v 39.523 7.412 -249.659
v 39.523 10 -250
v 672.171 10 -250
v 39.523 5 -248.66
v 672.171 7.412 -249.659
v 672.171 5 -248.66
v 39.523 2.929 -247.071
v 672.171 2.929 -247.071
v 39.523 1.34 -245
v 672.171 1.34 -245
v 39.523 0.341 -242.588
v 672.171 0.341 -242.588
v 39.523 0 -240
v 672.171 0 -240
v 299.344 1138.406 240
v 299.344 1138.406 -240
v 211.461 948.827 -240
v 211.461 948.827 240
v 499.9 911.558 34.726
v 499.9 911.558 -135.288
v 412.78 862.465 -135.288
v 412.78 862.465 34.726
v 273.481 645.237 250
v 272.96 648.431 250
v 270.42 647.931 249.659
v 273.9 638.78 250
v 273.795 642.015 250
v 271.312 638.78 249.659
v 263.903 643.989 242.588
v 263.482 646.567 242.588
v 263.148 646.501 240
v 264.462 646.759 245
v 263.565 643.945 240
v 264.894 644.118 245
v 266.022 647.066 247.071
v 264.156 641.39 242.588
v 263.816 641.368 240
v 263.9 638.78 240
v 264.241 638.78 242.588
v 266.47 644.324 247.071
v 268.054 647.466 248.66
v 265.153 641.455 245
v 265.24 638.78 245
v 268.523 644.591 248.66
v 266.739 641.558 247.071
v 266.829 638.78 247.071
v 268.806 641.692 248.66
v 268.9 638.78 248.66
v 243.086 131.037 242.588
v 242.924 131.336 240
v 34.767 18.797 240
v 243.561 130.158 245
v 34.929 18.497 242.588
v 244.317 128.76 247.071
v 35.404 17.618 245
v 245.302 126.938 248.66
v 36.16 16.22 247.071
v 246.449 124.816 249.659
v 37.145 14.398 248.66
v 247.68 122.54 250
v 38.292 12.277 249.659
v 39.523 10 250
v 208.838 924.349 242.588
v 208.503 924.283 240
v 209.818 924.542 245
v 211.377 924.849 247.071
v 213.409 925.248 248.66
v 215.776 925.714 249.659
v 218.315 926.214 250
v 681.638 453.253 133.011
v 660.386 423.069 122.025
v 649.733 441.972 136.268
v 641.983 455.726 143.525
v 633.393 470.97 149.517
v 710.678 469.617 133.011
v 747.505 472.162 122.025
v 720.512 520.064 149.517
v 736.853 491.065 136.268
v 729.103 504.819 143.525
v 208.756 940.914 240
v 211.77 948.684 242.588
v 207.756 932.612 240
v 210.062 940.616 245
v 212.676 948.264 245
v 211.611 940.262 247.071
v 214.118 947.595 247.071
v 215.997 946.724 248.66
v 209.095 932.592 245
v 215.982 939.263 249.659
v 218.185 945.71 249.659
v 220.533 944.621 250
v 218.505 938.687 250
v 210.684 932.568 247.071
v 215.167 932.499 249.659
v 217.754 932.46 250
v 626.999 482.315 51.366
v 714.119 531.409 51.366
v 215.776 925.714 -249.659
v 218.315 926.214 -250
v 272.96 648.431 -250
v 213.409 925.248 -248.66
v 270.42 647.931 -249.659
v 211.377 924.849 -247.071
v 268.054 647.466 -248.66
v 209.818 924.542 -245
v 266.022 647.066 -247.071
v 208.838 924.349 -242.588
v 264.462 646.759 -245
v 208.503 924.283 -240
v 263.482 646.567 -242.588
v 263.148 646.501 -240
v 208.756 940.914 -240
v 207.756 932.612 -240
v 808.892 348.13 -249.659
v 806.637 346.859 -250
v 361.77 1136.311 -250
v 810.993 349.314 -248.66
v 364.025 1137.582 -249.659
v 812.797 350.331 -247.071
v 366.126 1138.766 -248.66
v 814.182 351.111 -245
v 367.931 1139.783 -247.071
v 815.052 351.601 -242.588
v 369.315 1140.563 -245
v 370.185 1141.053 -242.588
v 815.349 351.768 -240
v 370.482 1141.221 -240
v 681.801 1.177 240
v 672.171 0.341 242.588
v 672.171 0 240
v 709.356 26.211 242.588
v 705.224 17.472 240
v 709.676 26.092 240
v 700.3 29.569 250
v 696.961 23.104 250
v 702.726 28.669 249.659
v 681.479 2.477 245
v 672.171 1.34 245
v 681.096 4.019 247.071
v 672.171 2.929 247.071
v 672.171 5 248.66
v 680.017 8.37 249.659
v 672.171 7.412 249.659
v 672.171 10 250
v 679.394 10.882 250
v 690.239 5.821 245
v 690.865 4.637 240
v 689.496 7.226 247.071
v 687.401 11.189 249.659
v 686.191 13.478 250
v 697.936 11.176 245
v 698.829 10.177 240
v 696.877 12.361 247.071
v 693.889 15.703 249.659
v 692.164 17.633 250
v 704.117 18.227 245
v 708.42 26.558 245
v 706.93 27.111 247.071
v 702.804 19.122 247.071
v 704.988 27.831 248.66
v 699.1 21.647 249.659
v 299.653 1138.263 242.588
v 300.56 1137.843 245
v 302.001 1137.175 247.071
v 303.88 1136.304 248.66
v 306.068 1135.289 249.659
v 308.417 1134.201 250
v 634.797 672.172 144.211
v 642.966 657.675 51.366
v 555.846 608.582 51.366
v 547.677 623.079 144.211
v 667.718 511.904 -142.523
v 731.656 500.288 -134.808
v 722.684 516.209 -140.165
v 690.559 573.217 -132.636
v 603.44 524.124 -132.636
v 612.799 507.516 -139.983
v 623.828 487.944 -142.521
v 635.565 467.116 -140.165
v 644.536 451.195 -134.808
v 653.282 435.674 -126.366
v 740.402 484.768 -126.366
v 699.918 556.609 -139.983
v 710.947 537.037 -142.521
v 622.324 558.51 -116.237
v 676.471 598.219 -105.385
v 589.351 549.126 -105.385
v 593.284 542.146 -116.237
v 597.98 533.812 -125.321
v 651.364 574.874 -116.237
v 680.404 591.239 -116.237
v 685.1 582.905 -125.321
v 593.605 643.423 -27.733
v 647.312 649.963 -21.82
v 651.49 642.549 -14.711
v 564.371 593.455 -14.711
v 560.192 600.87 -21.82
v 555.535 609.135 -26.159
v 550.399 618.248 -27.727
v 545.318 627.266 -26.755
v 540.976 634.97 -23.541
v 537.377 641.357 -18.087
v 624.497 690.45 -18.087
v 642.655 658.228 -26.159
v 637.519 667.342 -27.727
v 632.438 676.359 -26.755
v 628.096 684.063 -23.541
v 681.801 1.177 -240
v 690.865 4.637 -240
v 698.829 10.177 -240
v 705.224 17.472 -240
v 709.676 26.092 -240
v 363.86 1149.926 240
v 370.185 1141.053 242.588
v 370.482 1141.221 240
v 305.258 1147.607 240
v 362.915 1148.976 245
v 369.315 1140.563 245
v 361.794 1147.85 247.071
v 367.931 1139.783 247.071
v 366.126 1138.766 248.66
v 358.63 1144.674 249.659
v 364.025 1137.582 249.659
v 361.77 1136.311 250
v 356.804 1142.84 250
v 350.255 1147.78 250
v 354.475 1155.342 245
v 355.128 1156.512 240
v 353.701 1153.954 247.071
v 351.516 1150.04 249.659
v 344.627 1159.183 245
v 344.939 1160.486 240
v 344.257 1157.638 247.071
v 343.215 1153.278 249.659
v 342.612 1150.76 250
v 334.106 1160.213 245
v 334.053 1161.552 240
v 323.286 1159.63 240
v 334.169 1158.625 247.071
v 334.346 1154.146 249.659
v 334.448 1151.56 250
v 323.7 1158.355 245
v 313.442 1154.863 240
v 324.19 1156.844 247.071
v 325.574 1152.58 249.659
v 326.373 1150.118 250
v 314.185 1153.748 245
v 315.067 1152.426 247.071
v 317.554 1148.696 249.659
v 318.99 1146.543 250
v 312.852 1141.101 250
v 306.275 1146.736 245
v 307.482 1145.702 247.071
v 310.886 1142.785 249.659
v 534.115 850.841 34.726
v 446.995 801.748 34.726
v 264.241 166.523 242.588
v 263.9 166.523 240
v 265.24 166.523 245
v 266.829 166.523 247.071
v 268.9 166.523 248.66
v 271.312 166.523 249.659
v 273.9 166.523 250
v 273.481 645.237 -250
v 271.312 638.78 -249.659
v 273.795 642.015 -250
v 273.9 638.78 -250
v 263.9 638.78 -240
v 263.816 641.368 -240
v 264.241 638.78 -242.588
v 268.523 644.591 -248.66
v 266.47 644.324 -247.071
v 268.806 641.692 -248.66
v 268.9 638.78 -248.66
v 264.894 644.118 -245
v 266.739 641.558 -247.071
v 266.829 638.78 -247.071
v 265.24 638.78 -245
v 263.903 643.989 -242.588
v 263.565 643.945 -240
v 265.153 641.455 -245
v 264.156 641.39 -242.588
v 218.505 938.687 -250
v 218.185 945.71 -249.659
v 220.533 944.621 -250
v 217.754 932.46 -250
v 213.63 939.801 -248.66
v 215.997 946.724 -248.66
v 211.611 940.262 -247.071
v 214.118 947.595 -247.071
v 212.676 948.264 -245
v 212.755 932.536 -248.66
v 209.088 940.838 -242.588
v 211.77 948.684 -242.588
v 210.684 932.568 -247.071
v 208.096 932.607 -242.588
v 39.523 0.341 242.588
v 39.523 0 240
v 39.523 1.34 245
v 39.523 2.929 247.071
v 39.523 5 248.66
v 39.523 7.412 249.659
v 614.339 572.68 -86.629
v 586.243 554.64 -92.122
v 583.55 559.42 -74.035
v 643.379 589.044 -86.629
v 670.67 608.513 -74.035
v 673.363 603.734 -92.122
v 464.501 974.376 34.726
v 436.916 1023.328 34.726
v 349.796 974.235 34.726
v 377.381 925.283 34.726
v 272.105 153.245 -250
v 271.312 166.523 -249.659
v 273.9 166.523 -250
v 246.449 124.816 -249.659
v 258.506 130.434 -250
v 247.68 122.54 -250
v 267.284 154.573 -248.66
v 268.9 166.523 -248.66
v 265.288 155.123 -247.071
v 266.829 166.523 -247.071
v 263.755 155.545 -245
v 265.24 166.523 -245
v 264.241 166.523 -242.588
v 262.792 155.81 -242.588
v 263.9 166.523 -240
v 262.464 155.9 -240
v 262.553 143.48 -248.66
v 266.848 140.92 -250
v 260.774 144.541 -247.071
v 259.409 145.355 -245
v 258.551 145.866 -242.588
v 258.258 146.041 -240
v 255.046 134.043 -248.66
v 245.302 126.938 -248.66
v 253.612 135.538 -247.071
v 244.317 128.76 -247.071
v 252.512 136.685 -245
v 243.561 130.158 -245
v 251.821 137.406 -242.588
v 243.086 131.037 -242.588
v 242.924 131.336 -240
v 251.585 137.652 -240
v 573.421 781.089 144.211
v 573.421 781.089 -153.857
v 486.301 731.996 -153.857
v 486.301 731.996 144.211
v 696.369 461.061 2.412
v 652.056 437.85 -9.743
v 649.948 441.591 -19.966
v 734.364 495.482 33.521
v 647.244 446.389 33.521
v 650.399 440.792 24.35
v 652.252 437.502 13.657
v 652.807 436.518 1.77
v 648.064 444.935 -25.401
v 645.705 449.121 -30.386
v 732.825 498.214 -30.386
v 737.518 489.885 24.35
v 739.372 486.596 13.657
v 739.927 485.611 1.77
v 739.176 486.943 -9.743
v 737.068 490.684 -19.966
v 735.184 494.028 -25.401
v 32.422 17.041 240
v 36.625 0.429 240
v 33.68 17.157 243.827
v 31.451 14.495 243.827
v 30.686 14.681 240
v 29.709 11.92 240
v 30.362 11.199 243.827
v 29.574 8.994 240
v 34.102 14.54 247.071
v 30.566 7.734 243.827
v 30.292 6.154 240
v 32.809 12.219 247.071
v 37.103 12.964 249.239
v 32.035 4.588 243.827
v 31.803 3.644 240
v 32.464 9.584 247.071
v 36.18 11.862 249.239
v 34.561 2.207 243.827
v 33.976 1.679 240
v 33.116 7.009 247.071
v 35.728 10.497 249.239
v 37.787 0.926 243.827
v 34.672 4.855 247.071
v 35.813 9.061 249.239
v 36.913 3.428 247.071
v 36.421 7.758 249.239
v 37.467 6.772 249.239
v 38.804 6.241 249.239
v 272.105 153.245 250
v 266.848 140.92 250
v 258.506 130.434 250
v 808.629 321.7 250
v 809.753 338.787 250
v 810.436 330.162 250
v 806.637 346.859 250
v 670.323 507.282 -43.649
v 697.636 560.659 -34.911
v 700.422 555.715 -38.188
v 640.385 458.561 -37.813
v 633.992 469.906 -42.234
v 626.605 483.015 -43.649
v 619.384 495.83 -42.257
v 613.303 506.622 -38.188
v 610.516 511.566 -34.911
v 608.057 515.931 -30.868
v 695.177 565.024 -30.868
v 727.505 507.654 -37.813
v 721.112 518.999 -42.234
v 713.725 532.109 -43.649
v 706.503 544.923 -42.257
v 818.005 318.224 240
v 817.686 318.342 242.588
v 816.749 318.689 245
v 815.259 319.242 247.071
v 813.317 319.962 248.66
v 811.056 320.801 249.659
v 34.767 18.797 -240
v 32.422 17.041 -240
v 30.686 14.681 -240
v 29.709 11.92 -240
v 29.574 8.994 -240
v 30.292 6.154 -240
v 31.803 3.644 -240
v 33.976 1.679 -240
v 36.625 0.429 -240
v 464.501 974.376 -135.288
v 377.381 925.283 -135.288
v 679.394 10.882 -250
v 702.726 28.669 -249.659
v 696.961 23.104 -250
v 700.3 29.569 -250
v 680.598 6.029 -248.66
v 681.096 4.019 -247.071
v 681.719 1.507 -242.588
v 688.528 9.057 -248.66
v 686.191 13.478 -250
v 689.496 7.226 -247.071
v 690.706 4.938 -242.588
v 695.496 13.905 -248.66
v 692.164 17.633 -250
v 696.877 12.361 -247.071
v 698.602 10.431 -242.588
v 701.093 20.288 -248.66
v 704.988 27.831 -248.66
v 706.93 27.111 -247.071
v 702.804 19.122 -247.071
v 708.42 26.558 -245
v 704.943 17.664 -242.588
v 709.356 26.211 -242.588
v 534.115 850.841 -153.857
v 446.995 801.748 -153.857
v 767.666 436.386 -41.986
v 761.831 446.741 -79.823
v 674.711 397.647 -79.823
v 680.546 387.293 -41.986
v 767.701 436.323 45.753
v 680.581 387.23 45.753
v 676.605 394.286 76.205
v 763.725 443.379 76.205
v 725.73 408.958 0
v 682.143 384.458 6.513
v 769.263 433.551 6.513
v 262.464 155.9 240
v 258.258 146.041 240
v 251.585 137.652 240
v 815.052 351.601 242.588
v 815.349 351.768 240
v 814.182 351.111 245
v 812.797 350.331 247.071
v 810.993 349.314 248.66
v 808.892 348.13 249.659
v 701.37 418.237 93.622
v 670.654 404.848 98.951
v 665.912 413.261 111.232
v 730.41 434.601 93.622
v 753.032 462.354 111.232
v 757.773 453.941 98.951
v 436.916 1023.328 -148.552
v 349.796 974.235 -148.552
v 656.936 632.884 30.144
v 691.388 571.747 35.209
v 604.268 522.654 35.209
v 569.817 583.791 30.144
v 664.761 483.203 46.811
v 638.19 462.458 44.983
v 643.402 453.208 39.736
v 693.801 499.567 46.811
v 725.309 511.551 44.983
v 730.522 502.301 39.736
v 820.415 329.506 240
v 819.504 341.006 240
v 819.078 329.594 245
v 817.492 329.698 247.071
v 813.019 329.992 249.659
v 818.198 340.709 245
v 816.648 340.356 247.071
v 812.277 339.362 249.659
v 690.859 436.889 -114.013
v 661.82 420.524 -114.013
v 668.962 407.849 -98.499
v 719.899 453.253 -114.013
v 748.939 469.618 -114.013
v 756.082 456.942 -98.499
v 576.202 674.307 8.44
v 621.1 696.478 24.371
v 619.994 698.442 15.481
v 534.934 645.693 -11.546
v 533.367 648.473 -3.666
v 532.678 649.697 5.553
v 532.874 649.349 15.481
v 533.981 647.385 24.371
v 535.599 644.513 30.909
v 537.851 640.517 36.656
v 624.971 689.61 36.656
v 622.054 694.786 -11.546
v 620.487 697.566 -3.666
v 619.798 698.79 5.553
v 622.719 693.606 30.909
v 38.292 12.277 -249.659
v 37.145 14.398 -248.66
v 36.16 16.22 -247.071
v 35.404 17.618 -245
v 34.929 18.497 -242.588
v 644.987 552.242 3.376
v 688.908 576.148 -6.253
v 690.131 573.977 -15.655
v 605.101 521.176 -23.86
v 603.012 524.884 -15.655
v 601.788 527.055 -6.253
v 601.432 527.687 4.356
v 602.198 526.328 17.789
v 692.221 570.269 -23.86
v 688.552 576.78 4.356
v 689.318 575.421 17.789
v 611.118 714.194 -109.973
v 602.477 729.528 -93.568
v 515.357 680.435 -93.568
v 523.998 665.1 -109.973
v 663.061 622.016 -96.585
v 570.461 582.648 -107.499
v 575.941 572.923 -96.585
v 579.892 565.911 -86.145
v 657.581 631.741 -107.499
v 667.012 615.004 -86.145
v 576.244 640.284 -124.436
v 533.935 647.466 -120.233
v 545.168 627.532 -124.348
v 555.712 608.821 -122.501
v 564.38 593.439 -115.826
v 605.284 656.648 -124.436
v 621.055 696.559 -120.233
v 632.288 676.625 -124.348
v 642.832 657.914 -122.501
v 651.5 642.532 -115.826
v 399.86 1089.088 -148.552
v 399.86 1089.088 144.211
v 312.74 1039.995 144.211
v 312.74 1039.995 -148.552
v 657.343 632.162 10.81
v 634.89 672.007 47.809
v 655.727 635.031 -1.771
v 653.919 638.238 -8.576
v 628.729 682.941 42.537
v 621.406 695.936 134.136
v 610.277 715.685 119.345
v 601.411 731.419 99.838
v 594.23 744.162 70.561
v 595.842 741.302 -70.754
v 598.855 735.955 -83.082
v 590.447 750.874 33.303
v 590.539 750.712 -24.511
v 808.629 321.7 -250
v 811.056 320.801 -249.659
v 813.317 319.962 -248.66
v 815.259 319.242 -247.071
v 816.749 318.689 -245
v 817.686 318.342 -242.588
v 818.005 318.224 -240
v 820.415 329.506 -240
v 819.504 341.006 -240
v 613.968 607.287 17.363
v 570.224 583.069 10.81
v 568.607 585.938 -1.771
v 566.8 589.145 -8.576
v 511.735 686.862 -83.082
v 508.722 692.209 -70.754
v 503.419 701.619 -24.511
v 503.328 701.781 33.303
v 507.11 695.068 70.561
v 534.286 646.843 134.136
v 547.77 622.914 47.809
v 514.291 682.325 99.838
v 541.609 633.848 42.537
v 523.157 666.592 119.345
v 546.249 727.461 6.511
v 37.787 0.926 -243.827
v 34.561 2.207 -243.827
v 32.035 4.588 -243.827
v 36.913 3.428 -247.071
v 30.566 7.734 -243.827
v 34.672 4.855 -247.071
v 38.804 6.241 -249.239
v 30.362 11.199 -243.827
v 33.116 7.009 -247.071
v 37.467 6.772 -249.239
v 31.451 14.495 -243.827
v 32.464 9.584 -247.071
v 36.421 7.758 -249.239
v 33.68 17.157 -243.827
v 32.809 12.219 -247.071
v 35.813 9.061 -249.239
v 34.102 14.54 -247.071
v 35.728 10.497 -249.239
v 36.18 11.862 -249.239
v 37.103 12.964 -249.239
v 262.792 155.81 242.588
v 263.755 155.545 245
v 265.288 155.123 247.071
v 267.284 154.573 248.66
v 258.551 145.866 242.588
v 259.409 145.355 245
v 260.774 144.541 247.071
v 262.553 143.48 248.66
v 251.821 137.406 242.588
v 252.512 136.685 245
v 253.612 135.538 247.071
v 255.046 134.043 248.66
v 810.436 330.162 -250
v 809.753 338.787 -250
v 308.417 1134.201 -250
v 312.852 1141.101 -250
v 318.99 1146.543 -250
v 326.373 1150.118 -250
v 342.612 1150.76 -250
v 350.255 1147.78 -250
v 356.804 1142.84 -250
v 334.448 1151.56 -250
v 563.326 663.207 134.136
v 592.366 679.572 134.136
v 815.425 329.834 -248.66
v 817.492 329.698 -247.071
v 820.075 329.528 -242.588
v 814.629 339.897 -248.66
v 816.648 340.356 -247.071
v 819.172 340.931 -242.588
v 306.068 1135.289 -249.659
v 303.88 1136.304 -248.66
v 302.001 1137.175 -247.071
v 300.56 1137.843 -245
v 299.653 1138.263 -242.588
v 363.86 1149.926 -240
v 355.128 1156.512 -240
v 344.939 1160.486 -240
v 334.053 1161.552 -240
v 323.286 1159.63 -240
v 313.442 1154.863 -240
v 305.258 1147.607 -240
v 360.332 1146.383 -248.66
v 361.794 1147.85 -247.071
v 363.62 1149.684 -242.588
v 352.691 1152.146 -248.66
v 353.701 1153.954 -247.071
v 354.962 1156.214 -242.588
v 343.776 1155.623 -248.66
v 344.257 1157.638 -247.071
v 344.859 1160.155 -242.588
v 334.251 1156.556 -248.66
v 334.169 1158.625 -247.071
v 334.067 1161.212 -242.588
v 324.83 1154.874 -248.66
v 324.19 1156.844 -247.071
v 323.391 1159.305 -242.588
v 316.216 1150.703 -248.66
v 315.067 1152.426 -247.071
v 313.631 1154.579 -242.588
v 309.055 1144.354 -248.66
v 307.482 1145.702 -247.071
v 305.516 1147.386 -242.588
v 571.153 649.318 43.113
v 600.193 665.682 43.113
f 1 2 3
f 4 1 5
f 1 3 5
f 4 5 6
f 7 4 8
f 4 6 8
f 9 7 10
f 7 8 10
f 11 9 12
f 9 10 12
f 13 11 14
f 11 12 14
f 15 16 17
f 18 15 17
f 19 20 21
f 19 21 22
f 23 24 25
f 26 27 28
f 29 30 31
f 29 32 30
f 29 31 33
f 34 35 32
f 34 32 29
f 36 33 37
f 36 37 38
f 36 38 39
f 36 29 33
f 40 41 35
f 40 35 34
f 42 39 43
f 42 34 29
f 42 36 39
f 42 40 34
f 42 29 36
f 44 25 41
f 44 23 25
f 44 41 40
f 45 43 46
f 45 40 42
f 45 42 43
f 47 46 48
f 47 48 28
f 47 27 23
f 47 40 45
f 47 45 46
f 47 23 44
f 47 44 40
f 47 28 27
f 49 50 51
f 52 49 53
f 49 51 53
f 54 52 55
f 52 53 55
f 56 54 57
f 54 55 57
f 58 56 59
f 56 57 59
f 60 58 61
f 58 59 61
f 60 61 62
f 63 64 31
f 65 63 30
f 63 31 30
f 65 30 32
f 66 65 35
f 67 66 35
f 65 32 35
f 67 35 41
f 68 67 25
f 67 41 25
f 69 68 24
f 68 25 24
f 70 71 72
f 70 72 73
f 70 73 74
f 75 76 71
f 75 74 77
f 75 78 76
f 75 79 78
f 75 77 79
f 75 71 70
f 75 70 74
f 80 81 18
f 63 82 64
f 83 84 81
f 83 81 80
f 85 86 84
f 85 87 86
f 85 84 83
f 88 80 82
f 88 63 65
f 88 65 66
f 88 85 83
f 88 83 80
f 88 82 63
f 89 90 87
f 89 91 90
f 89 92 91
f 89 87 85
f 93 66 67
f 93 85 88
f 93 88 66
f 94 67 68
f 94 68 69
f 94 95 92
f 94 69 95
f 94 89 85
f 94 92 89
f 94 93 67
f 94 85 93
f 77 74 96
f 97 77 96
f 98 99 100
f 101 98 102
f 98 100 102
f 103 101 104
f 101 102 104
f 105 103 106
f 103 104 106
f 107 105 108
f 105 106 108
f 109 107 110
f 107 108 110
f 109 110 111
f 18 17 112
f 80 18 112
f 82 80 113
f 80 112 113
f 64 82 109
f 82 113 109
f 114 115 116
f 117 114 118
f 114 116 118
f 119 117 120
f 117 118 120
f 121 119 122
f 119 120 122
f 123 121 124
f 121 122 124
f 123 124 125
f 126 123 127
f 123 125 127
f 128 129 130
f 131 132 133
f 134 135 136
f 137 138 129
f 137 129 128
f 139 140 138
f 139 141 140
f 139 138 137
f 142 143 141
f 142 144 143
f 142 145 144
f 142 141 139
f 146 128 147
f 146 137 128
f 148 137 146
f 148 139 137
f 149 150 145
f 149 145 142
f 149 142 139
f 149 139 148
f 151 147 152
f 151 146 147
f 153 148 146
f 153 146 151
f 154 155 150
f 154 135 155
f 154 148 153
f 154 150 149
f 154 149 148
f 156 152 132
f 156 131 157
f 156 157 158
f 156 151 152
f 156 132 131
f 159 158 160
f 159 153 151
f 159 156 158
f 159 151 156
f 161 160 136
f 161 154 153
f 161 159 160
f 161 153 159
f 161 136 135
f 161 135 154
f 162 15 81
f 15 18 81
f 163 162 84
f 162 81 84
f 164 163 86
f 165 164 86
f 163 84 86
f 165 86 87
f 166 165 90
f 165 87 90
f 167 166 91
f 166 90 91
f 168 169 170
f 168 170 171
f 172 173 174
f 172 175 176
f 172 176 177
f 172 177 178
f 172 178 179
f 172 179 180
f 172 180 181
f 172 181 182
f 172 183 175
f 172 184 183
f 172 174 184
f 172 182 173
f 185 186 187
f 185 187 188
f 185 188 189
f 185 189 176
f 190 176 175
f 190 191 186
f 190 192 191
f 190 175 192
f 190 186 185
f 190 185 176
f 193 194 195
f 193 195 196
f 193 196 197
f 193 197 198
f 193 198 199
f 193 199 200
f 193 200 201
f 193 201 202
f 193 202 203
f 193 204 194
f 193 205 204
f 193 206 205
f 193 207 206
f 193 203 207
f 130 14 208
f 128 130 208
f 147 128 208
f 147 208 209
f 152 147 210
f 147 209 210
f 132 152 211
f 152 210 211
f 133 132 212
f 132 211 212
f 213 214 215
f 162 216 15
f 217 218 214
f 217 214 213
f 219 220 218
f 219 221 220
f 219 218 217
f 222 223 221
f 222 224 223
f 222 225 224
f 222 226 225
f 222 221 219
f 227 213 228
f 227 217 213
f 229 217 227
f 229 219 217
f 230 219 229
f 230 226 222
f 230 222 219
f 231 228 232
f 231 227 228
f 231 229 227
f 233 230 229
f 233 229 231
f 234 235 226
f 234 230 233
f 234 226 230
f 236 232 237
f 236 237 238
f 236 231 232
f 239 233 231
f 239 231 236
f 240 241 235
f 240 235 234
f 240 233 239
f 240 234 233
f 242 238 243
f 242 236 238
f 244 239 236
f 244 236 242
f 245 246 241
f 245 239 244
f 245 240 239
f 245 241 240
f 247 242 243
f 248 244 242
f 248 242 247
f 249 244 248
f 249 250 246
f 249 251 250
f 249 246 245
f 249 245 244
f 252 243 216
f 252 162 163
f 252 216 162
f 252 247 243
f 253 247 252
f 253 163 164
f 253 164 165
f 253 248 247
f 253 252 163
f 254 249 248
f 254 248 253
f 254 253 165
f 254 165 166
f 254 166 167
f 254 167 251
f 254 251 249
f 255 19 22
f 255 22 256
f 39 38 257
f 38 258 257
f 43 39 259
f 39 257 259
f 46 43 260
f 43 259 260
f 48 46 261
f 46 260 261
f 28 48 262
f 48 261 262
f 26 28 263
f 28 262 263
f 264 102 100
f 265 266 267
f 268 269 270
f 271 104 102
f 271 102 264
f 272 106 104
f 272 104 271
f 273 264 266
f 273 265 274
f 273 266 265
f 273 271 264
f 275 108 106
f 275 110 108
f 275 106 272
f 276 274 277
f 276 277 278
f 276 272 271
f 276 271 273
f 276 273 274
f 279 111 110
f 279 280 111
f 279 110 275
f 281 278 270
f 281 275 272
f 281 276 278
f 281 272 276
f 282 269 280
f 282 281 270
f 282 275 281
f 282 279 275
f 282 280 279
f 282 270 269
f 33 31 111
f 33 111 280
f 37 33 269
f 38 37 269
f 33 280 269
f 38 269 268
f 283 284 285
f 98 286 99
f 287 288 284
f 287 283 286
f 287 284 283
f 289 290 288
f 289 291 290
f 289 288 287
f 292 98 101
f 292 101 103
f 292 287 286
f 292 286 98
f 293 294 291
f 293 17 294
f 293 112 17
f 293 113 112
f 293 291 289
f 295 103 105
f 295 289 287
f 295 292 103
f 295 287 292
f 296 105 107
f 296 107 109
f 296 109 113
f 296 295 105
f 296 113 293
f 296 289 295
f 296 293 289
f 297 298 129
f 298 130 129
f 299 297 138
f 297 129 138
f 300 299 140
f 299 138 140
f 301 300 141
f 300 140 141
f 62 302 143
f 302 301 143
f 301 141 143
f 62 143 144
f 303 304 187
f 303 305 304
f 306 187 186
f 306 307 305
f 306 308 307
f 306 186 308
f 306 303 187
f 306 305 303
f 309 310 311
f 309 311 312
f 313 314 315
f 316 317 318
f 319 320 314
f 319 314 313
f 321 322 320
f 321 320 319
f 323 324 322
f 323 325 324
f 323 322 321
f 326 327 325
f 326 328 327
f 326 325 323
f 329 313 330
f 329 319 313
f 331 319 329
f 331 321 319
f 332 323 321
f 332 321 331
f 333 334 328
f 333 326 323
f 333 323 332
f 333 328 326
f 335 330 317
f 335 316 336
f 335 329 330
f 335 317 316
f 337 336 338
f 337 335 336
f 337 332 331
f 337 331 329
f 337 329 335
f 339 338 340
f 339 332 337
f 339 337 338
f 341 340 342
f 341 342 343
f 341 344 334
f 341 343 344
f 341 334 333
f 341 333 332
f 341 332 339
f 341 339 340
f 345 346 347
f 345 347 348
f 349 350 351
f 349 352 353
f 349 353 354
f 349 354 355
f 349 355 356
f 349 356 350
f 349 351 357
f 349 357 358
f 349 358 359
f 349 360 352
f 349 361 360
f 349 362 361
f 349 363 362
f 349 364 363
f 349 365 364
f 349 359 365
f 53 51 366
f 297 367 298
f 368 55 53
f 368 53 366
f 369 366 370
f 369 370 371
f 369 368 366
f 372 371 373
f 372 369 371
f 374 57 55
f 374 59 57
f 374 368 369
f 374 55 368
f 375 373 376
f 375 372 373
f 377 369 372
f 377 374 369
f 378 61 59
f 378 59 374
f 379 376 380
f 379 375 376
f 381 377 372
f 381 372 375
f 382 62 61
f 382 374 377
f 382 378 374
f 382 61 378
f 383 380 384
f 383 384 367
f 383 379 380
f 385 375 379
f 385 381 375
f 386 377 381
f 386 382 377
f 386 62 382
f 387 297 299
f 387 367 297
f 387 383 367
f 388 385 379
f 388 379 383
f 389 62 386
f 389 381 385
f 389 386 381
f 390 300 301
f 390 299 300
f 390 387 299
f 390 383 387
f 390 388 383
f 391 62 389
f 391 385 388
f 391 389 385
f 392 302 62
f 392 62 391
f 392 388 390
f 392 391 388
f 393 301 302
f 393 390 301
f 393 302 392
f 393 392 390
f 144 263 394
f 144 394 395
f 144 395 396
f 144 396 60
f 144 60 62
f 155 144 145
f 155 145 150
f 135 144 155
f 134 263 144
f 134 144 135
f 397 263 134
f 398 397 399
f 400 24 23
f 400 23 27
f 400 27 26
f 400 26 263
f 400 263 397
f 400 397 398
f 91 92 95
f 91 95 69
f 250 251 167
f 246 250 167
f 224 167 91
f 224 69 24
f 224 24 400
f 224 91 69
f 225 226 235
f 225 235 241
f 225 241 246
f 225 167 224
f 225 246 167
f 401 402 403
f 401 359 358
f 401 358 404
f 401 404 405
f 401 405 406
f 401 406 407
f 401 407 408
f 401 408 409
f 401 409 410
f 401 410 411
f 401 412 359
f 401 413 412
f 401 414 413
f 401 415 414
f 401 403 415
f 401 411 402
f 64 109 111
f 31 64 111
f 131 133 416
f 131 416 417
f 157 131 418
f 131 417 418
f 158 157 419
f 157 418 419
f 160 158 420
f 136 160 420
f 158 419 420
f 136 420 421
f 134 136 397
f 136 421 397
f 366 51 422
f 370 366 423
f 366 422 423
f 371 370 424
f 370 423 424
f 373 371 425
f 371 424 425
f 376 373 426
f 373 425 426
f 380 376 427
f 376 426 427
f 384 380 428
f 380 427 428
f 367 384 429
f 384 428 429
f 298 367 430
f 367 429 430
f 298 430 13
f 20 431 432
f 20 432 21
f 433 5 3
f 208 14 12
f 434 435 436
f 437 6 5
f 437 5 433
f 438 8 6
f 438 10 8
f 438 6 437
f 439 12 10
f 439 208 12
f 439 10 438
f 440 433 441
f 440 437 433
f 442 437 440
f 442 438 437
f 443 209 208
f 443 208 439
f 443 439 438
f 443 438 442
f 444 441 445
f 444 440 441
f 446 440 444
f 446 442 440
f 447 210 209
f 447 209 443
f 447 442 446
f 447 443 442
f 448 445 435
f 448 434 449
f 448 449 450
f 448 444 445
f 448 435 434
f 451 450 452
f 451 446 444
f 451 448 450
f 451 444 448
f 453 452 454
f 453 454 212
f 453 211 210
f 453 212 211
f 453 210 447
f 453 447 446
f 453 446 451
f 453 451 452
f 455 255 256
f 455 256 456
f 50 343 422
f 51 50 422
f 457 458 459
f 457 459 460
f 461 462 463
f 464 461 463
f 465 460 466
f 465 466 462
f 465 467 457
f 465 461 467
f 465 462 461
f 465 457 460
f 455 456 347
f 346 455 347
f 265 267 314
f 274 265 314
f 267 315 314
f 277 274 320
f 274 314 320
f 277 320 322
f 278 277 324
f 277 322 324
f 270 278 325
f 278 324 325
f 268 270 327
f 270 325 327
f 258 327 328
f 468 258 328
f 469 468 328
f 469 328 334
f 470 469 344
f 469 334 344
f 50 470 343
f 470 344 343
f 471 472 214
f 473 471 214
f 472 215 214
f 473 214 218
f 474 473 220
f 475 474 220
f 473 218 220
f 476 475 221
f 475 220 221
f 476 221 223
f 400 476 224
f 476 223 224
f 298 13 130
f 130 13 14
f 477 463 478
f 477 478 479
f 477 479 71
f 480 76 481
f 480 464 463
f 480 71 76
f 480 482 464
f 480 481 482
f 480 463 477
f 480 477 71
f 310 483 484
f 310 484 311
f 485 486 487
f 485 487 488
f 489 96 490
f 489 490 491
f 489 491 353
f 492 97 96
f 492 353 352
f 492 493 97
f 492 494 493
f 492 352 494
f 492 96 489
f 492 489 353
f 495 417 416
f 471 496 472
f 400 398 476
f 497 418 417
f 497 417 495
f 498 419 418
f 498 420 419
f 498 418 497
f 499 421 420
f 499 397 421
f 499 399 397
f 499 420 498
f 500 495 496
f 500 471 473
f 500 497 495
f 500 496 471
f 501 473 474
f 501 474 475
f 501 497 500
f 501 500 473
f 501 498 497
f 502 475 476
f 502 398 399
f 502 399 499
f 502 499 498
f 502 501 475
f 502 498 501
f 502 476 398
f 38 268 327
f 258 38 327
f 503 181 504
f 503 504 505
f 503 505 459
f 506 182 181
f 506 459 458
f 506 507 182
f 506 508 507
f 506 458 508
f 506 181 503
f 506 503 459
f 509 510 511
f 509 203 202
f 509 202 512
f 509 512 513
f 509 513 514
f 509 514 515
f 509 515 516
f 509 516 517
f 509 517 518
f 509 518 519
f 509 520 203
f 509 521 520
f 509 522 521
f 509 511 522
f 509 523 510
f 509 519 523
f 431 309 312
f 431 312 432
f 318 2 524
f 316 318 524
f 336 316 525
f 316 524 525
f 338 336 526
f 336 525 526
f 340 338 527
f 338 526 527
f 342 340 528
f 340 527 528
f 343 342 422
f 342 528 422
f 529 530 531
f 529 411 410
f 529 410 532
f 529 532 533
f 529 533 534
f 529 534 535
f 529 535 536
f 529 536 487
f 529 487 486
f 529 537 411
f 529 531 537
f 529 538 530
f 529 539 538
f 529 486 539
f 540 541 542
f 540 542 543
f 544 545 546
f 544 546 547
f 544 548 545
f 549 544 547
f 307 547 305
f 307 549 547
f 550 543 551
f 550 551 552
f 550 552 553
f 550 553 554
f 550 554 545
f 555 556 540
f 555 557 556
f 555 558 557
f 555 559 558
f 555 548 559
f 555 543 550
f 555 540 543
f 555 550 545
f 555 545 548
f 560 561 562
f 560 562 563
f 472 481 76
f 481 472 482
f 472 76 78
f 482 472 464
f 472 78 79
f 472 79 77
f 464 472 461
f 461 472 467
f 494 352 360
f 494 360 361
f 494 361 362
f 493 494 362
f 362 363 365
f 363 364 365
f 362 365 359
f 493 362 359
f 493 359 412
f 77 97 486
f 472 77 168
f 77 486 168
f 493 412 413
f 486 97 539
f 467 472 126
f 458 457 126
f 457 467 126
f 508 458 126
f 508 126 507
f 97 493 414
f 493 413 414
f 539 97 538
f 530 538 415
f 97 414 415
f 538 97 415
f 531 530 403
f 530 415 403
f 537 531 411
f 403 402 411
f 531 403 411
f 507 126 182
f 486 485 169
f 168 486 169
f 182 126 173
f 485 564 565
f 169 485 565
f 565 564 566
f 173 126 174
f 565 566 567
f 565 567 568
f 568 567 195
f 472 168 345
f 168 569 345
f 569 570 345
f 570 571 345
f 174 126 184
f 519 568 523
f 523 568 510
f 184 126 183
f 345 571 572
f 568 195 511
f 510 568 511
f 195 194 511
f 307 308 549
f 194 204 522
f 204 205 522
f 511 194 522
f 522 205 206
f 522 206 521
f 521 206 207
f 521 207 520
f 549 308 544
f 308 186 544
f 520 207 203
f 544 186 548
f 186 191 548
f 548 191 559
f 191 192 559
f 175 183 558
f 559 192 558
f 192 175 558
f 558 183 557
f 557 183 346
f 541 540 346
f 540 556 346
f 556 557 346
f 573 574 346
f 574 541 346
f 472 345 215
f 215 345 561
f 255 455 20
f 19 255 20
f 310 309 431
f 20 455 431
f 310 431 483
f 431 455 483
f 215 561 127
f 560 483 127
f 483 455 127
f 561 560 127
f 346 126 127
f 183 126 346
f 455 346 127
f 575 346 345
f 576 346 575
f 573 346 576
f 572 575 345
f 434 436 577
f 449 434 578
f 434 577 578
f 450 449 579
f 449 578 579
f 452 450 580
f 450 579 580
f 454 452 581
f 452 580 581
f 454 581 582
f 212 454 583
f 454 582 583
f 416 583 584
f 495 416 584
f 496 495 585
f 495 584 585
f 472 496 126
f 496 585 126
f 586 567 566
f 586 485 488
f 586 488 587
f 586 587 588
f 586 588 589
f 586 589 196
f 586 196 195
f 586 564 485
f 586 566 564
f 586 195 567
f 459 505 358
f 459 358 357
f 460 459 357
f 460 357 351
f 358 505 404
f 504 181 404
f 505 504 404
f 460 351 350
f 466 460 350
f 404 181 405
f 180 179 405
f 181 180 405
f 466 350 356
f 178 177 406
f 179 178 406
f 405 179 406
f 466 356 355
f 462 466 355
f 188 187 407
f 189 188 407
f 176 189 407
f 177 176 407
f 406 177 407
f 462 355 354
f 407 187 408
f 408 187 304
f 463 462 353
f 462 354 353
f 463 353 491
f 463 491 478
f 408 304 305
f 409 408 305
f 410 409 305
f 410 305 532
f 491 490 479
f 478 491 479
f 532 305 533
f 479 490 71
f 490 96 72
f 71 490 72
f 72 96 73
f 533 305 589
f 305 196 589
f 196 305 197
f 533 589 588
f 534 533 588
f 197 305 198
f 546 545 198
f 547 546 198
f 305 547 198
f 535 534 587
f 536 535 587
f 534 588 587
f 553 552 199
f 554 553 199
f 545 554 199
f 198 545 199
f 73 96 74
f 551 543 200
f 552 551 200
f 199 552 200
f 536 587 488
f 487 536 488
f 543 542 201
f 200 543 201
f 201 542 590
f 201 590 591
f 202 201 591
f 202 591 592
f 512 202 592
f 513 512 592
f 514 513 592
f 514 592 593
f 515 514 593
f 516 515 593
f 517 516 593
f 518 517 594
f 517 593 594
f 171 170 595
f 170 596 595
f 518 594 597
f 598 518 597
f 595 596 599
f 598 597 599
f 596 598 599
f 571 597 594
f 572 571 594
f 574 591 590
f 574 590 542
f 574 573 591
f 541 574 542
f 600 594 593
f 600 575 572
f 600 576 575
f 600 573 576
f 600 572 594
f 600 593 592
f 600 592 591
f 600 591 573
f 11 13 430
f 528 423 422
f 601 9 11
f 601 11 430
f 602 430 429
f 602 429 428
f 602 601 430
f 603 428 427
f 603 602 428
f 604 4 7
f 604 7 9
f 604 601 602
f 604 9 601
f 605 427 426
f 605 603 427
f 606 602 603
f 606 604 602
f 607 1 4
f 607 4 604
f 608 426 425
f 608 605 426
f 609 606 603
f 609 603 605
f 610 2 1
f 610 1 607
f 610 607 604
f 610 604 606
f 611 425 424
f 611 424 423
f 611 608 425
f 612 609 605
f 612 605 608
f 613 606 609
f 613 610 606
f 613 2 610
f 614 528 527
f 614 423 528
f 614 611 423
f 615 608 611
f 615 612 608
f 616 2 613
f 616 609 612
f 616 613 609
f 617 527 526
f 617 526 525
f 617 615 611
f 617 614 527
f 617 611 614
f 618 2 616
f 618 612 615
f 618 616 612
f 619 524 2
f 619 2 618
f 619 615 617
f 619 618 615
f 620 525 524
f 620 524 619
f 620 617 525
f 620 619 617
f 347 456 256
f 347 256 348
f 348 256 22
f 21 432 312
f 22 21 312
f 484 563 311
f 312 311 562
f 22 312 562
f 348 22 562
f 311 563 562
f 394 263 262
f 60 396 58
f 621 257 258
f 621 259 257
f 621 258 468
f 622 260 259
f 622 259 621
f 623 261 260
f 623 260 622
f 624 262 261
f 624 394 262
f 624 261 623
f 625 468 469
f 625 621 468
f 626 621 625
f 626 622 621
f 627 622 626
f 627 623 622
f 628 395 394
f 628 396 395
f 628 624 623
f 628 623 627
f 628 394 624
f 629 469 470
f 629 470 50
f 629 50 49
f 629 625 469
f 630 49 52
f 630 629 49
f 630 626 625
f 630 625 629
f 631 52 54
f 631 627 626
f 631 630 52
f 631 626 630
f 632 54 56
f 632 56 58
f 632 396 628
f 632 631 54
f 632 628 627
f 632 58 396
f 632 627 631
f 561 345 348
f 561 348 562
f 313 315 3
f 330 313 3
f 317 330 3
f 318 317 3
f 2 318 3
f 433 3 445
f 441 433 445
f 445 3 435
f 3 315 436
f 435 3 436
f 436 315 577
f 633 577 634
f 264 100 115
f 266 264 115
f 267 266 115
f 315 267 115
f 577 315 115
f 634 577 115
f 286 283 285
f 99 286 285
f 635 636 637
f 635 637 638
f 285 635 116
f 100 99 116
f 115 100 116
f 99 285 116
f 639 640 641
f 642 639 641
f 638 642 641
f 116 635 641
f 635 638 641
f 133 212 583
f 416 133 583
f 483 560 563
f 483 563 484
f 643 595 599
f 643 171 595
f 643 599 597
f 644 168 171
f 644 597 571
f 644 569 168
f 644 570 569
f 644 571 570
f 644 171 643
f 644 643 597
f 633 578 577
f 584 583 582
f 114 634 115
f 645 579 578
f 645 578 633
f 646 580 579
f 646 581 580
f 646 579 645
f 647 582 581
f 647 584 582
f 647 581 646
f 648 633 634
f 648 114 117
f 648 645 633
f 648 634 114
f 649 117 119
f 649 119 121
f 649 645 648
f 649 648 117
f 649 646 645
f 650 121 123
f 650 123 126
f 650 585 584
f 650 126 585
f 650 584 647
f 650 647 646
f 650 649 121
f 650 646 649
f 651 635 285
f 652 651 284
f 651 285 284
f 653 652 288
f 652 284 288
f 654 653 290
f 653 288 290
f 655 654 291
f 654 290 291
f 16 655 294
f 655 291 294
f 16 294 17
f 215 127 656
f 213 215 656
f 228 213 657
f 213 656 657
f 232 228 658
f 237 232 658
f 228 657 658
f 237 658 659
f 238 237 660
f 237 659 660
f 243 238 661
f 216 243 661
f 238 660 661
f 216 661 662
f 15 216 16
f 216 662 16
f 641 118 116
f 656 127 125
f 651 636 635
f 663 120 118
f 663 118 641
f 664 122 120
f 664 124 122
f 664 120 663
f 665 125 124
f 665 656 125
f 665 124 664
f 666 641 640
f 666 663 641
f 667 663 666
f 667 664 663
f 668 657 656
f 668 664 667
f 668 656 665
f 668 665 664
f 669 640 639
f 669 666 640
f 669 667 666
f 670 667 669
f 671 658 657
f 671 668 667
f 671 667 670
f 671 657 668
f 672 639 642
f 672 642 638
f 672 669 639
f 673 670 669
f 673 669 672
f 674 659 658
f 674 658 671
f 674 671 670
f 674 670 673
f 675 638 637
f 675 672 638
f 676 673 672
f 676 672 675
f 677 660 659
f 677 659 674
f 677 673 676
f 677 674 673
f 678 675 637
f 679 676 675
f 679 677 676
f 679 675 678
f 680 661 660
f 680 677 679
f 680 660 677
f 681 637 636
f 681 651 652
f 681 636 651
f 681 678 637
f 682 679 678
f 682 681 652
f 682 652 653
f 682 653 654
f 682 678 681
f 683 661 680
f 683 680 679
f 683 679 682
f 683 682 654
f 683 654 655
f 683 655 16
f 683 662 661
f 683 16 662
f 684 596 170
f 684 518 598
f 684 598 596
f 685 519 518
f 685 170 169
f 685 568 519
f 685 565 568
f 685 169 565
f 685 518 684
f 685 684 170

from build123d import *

# Parameters (mm, degrees)
BOSS_EXTRUDE4_DEPTH      = 250
BOSS_EXTRUDE4_DEPTH_BACK = 250
FILLET1_R                = 10
FILLET2_R                = 10
FILLET3_R                = 10
CUT_EXTRUDE1_DEPTH       = 100


with BuildPart() as part:
    # Sketch5 → Boss-Extrude4 (new, two sides: drawn at the far end of the back side and taken through both)
    with BuildSketch(Plane.XY.offset(-BOSS_EXTRUDE4_DEPTH_BACK)):
        with BuildLine():
            Line((0, 0), (672.171335821, 0))
            ThreePointArc((672.171335821, 0), (695.015340994, 7.164783727), (709.67572834, 26.092428616))
            Line((709.67572834, 26.092428616), (818.005303321, 318.223584322))
            ThreePointArc((818.005303321, 318.223584322), (820.376071762, 335.288930001), (815.348837324, 351.768416645))
            Line((815.348837324, 351.768416645), (740.331547095, 484.892737084))
            Line((740.331547095, 484.892737084), (370.482259657, 1141.220563707))
            ThreePointArc((370.482259657, 1141.220563707), (334.053202103, 1161.55204086), (299.344064495, 1138.4063941))
            Line((299.344064495, 1138.4063941), (211.46075369, 948.827148814))
            ThreePointArc((211.46075369, 948.827148814), (208.038304344, 936.789455071), (208.503214572, 924.283333024))
            Line((208.503214572, 924.283333024), (263.147839607, 646.500885254))
            ThreePointArc((263.147839607, 646.500885254), (263.711539672, 642.658800356), (263.900031848, 638.780160797))
            Line((263.900031848, 638.780160797), (263.900031848, 166.522987154))
            ThreePointArc((263.900031848, 166.522987154), (258.258035835, 146.04061517), (242.923653745, 131.336316241))
            Line((242.923653745, 131.336316241), (0, 0))
        make_face()
    extrude(amount=BOSS_EXTRUDE4_DEPTH + BOSS_EXTRUDE4_DEPTH_BACK)

    # Fillet1
    fillet1_edges = [part.edges().sort_by_distance(p)[0] for p in [
        (121.461826872, 65.66815812, 250),
        (336.085667911, 0, 250),
        (695.015340994, 7.164783727, 250),
        (763.840515831, 172.158006469, 250),
        (820.376071762, 335.288930001, 250),
        (592.91554849, 746.494490176, 250),
        (334.053202103, 1161.55204086, 250),
        (255.402409092, 1043.616771457, 250),
        (208.038304344, 936.789455071, 250),
        (235.825527089, 785.392109139, 250),
        (263.711539672, 642.658800356, 250),
        (263.900031848, 402.651573975, 250),
        (258.258035835, 146.04061517, 250),
    ]]
    fillet(fillet1_edges, radius=FILLET1_R)

    # Fillet2
    fillet2_edges = [part.edges().sort_by_distance(p)[0] for p in [
        (695.015340994, 7.164783727, -250),
        (763.840515831, 172.158006469, -250),
        (820.376071762, 335.288930001, -250),
        (592.91554849, 746.494490176, -250),
        (334.053202103, 1161.55204086, -250),
        (255.402409092, 1043.616771457, -250),
        (208.038304344, 936.789455071, -250),
        (235.825527089, 785.392109139, -250),
        (263.711539672, 642.658800356, -250),
        (121.461826872, 65.66815812, -250),
        (263.900031848, 402.651573975, -250),
        (258.258035835, 146.04061517, -250),
        (336.085667911, 0, -250),
    ]]
    fillet(fillet2_edges, radius=FILLET2_R)

    # Fillet3
    # the kernel refuses this fillet: 10 mm, written as the material it takes off along each edge
    with BuildSketch(Plane(origin=(39.52279504, 10, 240), x_dir=(0, -1, 0), z_dir=(0, 0, 1))) as fillet3_piece_1_section:
        Polygon((0, 0), (FILLET3_R, 0), (FILLET3_R, -FILLET3_R * 3.95227950403), (-FILLET3_R * 0.879666772827, -FILLET3_R * 0.475590547408), align=None)
    fillet3_piece_1 = extrude(amount=FILLET3_R, mode=Mode.PRIVATE)
    fillet3_piece_1 = fillet3_piece_1 - Plane(origin=(39.52279504, 10, 240), x_dir=(0.9694500432790283, 0.24528883706008733, 0), z_dir=(0, 0, 1)) * Sphere(FILLET3_R, mode=Mode.PRIVATE)
    add(fillet3_piece_1, mode=Mode.SUBTRACT)
    with BuildSketch(Plane(origin=(39.52279504, 10, -240), x_dir=(0, -1, 0), z_dir=(0, 0, -1))) as fillet3_piece_2_section:
        Polygon((0, 0), (FILLET3_R, 0), (FILLET3_R, FILLET3_R * 3.95227950403), (-FILLET3_R * 0.879666772827, FILLET3_R * 0.475590547408), align=None)
    fillet3_piece_2 = extrude(amount=FILLET3_R, mode=Mode.PRIVATE)
    fillet3_piece_2 = fillet3_piece_2 - Plane(origin=(39.52279504, 10, -240), x_dir=(0.9694500432790283, 0.24528883706008733, 0), z_dir=(0, 0, -1)) * Sphere(FILLET3_R, mode=Mode.PRIVATE)
    add(fillet3_piece_2, mode=Mode.SUBTRACT)
    with BuildSketch(Plane(origin=(0, 0, -240), x_dir=(1, 0, 0), z_dir=(0, 0, 1))) as fillet3_piece_3:
        with BuildLine():
            CenterArc((FILLET3_R * 3.95227950403, FILLET3_R), FILLET3_R, 118.397807475, 151.602192525)
            Line((FILLET3_R * 3.47668895662, FILLET3_R * 1.87966677283), (0, 0))
            Line((0, 0), (FILLET3_R * 3.95227950403, 0))
        make_face()
    extrude(amount=480, mode=Mode.SUBTRACT)

    # Sketch11 → Cut-Extrude1 (cut)
    with BuildSketch(Plane(origin=(769.289421626, 433.504619004, 0), x_dir=(0, 0, -1), z_dir=(0.8711981630321445, 0.4909315234627098, 0))):
        Polygon((-144.211144, 752.50763293), (148.55197, 752.50763293), (148.55197, 677.02589093), (-34.726412, 677.02589093), (-34.726412, 620.83659693), (135.288398, 620.83659693), (135.288398, 548.73101093), (-34.726412, 548.73101093), (-34.726412, 479.03698093), (153.857396, 479.03698093), (153.857396, 398.97330493), (-144.211144, 398.97330493), align=None)
        with BuildLine():
            Line((-51.366168, 257.313168), (-144.211144, 273.952938))
            add(Edge.make_bspline(
                [(-144.211144, 273.952938), (-136.494162, 303.534714), (-121.703274, 326.20336), (-99.838466, 341.958862)],
                knots=[0, 0, 0, 0, 1, 1, 1, 1], degree=3))
            add(Edge.make_bspline(
                [(-99.838466, 341.958862), (-77.812896, 357.714378), (-46.703804, 365.592122), (-6.511176, 365.592122)],
                knots=[0, 0, 0, 0, 1, 1, 1, 1], degree=3))
            add(Edge.make_bspline(
                [(-6.511176, 365.592122), (39.62994, 365.592122), (72.989812, 356.9909), (93.568468, 339.788456)],
                knots=[0, 0, 0, 0, 1, 1, 1, 1], degree=3))
            add(Edge.make_bspline(
                [(93.568468, 339.788456), (114.147082, 322.585998), (124.436396, 300.962382), (124.436396, 274.91758)],
                knots=[0, 0, 0, 0, 1, 1, 1, 1], degree=3))
            add(Edge.make_bspline(
                [(124.436396, 274.91758), (124.436396, 259.644378), (120.25636, 245.818104), (111.896288, 233.438772)],
                knots=[0, 0, 0, 0, 1, 1, 1, 1], degree=3))
            add(Edge.make_bspline(
                [(111.896288, 233.438772), (103.536216, 221.05944), (90.915734, 210.207438), (74.034828, 200.882752)],
                knots=[0, 0, 0, 0, 1, 1, 1, 1], degree=3))
            add(Edge.make_bspline(
                [(74.034828, 200.882752), (87.700312, 197.506554), (98.150402, 193.567668), (105.38507, 189.066094)],
                knots=[0, 0, 0, 0, 1, 1, 1, 1], degree=3))
            add(Edge.make_bspline(
                [(105.38507, 189.066094), (117.121312, 181.831426), (126.204848, 172.26559), (132.635664, 160.368586)],
                knots=[0, 0, 0, 0, 1, 1, 1, 1], degree=3))
            add(Edge.make_bspline(
                [(132.635664, 160.368586), (139.22727, 148.632316), (142.52308, 134.564906), (142.52308, 118.166328)],
                knots=[0, 0, 0, 0, 1, 1, 1, 1], degree=3))
            add(Edge.make_bspline(
                [(142.52308, 118.166328), (142.52308, 97.587686), (137.137266, 77.812896), (126.365638, 58.841986)],
                knots=[0, 0, 0, 0, 1, 1, 1, 1], degree=3))
            add(Edge.make_bspline(
                [(126.365638, 58.841986), (115.59401, 40.031838), (100.079658, 25.4821), (79.822582, 15.192814)],
                knots=[0, 0, 0, 0, 1, 1, 1, 1], degree=3))
            add(Edge.make_bspline(
                [(79.822582, 15.192814), (59.565478, 5.064276), (32.957946, 0), (0, 0)],
                knots=[0, 0, 0, 0, 1, 1, 1, 1], degree=3))
            add(Edge.make_bspline(
                [(0, 0), (-32.154108, 0), (-57.555834, 3.778096), (-76.205206, 11.334288)],
                knots=[0, 0, 0, 0, 1, 1, 1, 1], degree=3))
            add(Edge.make_bspline(
                [(-76.205206, 11.334288), (-94.693816, 18.890508), (-109.967018, 29.9033), (-122.024798, 44.372636)],
                knots=[0, 0, 0, 0, 1, 1, 1, 1], degree=3))
            add(Edge.make_bspline(
                [(-122.024798, 44.372636), (-133.92183, 59.002776), (-143.085754, 77.33061), (-149.51657, 99.356152)],
                knots=[0, 0, 0, 0, 1, 1, 1, 1], degree=3))
            Line((-149.51657, 99.356152), (-51.366168, 112.378574))
            add(Edge.make_bspline(
                [(-51.366168, 112.378574), (-47.50767, 92.603812), (-41.559154, 78.85794), (-33.520634, 71.140958)],
                knots=[0, 0, 0, 0, 1, 1, 1, 1], degree=3))
            add(Edge.make_bspline(
                [(-33.520634, 71.140958), (-25.321338, 63.584738), (-14.95165, 59.806628), (-2.411556, 59.806628)],
                knots=[0, 0, 0, 0, 1, 1, 1, 1], degree=3))
            add(Edge.make_bspline(
                [(-2.411556, 59.806628), (10.771628, 59.806628), (21.704032, 64.62974), (30.385642, 74.275978)],
                knots=[0, 0, 0, 0, 1, 1, 1, 1], degree=3))
            add(Edge.make_bspline(
                [(30.385642, 74.275978), (39.228028, 83.922202), (43.649214, 96.783848), (43.649214, 112.860888)],
                knots=[0, 0, 0, 0, 1, 1, 1, 1], degree=3))
            add(Edge.make_bspline(
                [(43.649214, 112.860888), (43.649214, 129.259494), (39.388804, 141.960364), (30.86797, 150.963498)],
                knots=[0, 0, 0, 0, 1, 1, 1, 1], degree=3))
            add(Edge.make_bspline(
                [(30.86797, 150.963498), (22.507898, 159.966632), (11.09318, 164.468206), (-3.376156, 164.468206)],
                knots=[0, 0, 0, 0, 1, 1, 1, 1], degree=3))
            add(Edge.make_bspline(
                [(-3.376156, 164.468206), (-11.093138, 164.468206), (-21.70399, 162.538964), (-35.208726, 158.680494)],
                knots=[0, 0, 0, 0, 1, 1, 1, 1], degree=3))
            Line((-35.208726, 158.680494), (-30.144478, 228.856796))
            add(Edge.make_bspline(
                [(-30.144478, 228.856796), (-24.678262, 228.052944), (-20.417838, 227.651018), (-17.363192, 227.651018)],
                knots=[0, 0, 0, 0, 1, 1, 1, 1], degree=3))
            add(Edge.make_bspline(
                [(-17.363192, 227.651018), (-4.501546, 227.651018), (6.189694, 231.75068), (14.710528, 239.94999)],
                knots=[0, 0, 0, 0, 1, 1, 1, 1], degree=3))
            add(Edge.make_bspline(
                [(14.710528, 239.94999), (23.39211, 248.149272), (27.732908, 257.875884), (27.732908, 269.129826)],
                knots=[0, 0, 0, 0, 1, 1, 1, 1], degree=3))
            add(Edge.make_bspline(
                [(27.732908, 269.129826), (27.732908, 279.901454), (24.5175, 288.502676), (18.086684, 294.933492)],
                knots=[0, 0, 0, 0, 1, 1, 1, 1], degree=3))
            add(Edge.make_bspline(
                [(18.086684, 294.933492), (11.655854, 301.364308), (2.813482, 304.57973), (-8.44046, 304.57973)],
                knots=[0, 0, 0, 0, 1, 1, 1, 1], degree=3))
            add(Edge.make_bspline(
                [(-8.44046, 304.57973), (-20.015912, 304.57973), (-29.420972, 301.04277), (-36.655654, 293.96885)],
                knots=[0, 0, 0, 0, 1, 1, 1, 1], degree=3))
            add(Edge.make_bspline(
                [(-36.655654, 293.96885), (-43.890322, 287.055734), (-48.793836, 274.837164), (-51.366168, 257.313168)],
                knots=[0, 0, 0, 0, 1, 1, 1, 1], degree=3))
        make_face()
    extrude(amount=-CUT_EXTRUDE1_DEPTH, mode=Mode.SUBTRACT)


solid = part.part
